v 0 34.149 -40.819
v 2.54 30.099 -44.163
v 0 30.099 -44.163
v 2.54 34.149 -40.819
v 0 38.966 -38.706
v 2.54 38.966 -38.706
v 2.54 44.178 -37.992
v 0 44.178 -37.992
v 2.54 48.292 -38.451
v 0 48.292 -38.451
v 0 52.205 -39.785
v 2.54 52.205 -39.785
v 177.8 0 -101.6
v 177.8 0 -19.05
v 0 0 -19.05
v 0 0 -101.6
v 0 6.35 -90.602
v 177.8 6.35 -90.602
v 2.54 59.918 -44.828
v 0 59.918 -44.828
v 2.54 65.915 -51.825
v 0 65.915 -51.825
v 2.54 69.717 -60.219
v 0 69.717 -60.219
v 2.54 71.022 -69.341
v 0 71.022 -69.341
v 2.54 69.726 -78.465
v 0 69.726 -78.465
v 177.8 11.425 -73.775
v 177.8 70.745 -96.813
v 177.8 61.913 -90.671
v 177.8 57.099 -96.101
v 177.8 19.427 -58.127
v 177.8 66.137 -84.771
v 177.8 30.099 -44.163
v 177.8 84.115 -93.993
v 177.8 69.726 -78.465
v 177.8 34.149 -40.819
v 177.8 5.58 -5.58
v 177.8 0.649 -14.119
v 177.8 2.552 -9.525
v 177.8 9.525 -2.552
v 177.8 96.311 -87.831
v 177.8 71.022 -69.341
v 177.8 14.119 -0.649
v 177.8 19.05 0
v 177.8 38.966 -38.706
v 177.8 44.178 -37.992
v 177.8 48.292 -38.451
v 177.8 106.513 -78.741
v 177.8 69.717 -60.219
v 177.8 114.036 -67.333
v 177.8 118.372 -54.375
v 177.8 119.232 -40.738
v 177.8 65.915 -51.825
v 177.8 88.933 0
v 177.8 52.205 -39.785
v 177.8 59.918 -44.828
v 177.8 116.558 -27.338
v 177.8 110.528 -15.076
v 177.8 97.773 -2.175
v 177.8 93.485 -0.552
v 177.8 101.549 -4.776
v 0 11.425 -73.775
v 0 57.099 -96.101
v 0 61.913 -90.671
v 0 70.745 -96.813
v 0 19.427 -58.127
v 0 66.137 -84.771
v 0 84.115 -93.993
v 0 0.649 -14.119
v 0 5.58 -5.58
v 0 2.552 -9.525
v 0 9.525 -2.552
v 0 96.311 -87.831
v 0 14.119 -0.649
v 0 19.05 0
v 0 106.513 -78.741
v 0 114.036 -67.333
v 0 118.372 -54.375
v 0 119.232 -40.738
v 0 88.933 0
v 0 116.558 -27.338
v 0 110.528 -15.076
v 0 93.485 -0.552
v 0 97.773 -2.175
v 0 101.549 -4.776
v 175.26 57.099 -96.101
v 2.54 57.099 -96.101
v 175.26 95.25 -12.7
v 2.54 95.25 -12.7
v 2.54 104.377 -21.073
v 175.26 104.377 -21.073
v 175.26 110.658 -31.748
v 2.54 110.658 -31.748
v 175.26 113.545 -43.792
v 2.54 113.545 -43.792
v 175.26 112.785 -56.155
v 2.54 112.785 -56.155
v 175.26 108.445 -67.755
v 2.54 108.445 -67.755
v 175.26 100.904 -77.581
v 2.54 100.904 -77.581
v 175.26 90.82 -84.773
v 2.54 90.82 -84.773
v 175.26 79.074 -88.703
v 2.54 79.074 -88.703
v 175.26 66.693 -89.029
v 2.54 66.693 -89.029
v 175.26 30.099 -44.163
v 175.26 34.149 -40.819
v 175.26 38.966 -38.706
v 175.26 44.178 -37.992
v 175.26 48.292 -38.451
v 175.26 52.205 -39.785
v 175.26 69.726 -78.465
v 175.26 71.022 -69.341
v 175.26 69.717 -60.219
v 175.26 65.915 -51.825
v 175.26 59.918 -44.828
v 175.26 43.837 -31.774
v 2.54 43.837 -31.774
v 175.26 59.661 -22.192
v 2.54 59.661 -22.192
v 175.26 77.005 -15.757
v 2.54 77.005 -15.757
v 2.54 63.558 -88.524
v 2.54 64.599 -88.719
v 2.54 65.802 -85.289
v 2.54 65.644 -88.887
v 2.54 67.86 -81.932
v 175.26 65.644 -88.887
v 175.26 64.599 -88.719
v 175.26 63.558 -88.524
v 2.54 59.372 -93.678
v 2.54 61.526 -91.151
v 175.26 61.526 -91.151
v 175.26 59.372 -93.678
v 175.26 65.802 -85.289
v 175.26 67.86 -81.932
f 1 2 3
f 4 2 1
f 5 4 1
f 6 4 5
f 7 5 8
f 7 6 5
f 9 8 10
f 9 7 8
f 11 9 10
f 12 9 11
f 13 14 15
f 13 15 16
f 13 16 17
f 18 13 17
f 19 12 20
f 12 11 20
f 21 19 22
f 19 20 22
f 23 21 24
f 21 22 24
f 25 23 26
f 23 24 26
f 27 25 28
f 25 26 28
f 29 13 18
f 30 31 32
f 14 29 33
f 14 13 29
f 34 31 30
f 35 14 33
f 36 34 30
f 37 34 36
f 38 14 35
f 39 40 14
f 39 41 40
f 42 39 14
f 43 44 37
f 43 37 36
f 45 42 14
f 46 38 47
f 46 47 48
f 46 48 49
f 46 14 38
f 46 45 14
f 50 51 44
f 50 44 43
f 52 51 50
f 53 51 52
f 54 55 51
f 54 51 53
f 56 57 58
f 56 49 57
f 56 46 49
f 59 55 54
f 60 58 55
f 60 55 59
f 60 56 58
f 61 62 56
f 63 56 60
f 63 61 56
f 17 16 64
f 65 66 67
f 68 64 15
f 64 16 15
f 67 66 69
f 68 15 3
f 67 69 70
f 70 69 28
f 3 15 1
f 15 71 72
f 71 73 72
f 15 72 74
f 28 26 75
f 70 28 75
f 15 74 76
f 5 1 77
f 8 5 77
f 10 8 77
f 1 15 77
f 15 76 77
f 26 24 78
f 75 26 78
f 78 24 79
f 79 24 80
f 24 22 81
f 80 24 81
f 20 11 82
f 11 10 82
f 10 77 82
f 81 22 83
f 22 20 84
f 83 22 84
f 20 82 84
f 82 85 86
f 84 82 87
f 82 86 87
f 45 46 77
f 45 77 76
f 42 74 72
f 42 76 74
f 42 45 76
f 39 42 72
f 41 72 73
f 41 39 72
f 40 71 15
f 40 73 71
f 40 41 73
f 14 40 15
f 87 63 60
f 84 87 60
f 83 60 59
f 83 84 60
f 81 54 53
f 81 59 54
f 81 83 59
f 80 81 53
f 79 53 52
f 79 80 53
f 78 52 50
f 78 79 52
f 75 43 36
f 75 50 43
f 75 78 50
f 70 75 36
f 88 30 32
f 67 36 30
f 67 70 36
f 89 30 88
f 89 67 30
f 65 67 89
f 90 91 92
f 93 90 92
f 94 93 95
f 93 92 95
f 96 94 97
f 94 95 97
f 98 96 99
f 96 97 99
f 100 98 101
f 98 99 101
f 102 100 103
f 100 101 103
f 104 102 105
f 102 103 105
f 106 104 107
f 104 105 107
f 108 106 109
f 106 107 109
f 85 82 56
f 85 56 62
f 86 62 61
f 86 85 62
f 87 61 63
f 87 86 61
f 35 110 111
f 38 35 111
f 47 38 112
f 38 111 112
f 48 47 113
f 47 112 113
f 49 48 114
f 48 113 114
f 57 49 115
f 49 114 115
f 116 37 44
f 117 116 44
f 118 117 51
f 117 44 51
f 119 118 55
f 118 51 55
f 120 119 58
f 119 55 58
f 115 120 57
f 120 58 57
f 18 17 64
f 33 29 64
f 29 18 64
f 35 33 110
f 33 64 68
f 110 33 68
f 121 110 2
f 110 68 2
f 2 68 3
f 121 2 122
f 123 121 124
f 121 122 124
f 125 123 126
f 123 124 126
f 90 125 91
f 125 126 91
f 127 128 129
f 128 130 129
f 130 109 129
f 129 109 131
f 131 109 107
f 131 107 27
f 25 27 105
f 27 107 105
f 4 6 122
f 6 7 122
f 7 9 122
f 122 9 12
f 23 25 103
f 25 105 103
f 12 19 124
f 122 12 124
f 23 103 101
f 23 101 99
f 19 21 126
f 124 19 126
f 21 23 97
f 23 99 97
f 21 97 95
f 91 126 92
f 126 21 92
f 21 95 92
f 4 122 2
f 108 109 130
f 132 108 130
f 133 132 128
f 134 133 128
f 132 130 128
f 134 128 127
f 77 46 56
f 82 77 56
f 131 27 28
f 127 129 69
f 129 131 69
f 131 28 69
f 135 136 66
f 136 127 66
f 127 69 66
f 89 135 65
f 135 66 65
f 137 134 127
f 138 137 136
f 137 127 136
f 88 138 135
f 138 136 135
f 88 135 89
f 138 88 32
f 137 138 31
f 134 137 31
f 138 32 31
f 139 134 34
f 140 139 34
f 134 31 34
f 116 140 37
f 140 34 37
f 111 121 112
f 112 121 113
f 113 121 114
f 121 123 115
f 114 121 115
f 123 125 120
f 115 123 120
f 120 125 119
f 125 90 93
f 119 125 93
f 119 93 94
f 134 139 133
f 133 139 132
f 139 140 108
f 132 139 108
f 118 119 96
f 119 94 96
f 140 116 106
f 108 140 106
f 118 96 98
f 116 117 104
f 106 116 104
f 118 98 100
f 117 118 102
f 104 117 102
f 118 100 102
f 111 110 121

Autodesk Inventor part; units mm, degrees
ref_plane "YZ Plane" through (0, 0, 0) normal (1, 0, 0) x (0, 1, 0)
ref_plane "XZ Plane" through (0, 0, 0) normal (0, 1, 0) x (-1, 0, 0)
sketch "Sketch1" plane through (0, 0, 0) normal (1, 0, 0) x (0, 1, 0)
  line L0 (0, 0) -> (95.25, 0)
  line L1 (0, 0) -> (0, -101.6)
  line L2 (0, -101.6) -> (6.35, -90.6015)
  line L3 (0, -101.6) -> (12.7, -101.6) construction
  arc A0 (66.6929, -89.0292) -> (95.25, -12.7) centre (71.7931, -47.4307) ccw
  arc A1 (57.0991, -96.1007) -> (95.25, 0) centre (66.6458, -44.2676) ccw
  arc A2 (57.0991, -96.1007) -> (66.6929, -89.0292) centre (51.9568, -79.0806) ccw
  arc A3 (95.25, -12.7) -> (6.35, -90.6015) centre (102.2308, -110.3428) ccw
  dimension "d18" = 101.6
  dimension "d20" = 12.7
  dimension "d21" = 60
  dimension "d27" = 41.91
  dimension "d28" = 52.705
  dimension "d29" = 17.78
  dimension "d30" = 57.099
  dimension "d31" = 66.6458
  dimension "d32" = 71.7931
  dimension "d33" = 95.25
  dimension "d34" = 66.6929
  dimension "d35" = 12.7
  dimension "d36" = 96.1007
  dimension "d38" = 74.276
extrude "Extrusion1" add sketch "Sketch1" along normal blind 177.8
sketch "Sketch2" plane through (177.8, 0, 0) normal (1, 0, 0) x (0, 0, -1)
  arc A0 (89.0292, 66.6929) -> (12.7, 95.25) centre (47.4307, 71.7931) ccw projected
  arc A1 (12.7, 95.25) -> (90.6015, 6.35) centre (110.3428, 102.2308) ccw projected
  line L0 (0, 95.25) -> (0, 0) projected
  arc A2 (96.1007, 57.0991) -> (89.0292, 66.6929) centre (79.0806, 51.9568) ccw projected
  line L1 (0, 58.8778) -> (0, 95.25)
  line L2 (0, 0) -> (101.6, 0) projected
  arc A3 (78.465, 69.7261) -> (36.7184, 37.715) centre (69.3573, 38.3767) ccw
  arc A4 (96.1007, 57.0991) -> (78.465, 69.7261) centre (47.1123, 7.3079) ccw
  line L3 (0, 58.8778) -> (36.7184, 37.715)
  arc A5 (96.1007, 57.0991) -> (0, 95.25) centre (44.2676, 66.6458) ccw
  arc A6 (96.1007, 57.0991) -> (0, 95.25) centre (44.2676, 66.6458) ccw projected
  arc A7 (12.7, 95.25) -> (36.7184, 37.715) centre (110.3428, 102.2308) ccw
  arc A8 (89.0292, 66.6929) -> (12.7, 95.25) centre (47.4307, 71.7931) ccw
  arc A9 (96.1007, 57.0991) -> (89.0292, 66.6929) centre (79.0806, 51.9568) ccw
  dimension "d49" = 21.1628
  dimension "d50" = 32.6457
  dimension "d51" = 69.85
  dimension "d52" = 16.8716
  dimension "d53" = 59.3379
ref_plane "Work Plane1" through (88.9, 0, 0) normal (1, 0, 0) x (0, 0, -1)
extrude "Extrusion2" add sketch "Sketch2" against normal blind 2.54
fillet "Fillet3" radius 19.05 1 edges at (176.53, 37.715, -36.7184)
mirror "Mirror1" about plane through (88.9, 0, 0) normal (1, 0, 0) of "Extrusion2", "Fillet3"
fillet "Fillet2" radius 19.05 2 edges at (88.9, 0, 0) (88.9, 95.25, 0)
sketch "Sketch3" plane through (2.54, 71.7931, -47.4307) normal (1, 0, 0) x (0, -0.3504094, -0.9365966)
  arc A0 (50.7331, 3.2921) -> (40.7482, 9.7997) centre (36.594, -7.4882) ccw projected
  arc A1 (40.7482, 9.7997) -> (-40.7482, 9.7997) centre (0, 0) ccw projected
  arc A2 (50.7331, 3.2921) -> (29.7909, 8.9388) centre (22.298, -60.5081) ccw projected
  arc A3 (50.7331, 3.2921) -> (-50.3771, 12.9226) centre (-1.1589, -5.9293) ccw projected
  arc A4 (50.7331, 3.2921) -> (40.7482, 9.7997) centre (36.594, -7.4882) ccw
  arc A5 (41.3731, 6.6868) -> (40.7482, 9.7997) centre (0, 0) ccw
  arc A6 (50.7331, 3.2921) -> (29.7909, 8.9388) centre (22.298, -60.5081) ccw projected
  arc A7 (-35.8187, -21.7593) -> (-43.5602, -37.2333) centre (22.298, -60.5081) ccw
  arc A8 (50.7331, 3.2921) -> (41.3731, 6.6868) centre (22.298, -60.5081) ccw
  point P0 (-19.2665, -83.8613)
extrude "Extrusion3" add sketch "Sketch3" along normal up to next
sketch "Sketch4" plane through (177.8, 0, 0) normal (1, 0, 0) x (0, 0, -1)
  arc A0 (96.1007, 57.0991) -> (4.7759, 101.5489) centre (44.2676, 66.6458) ccw projected
  line L0 (19.05, 0) -> (101.6, 0) projected
  arc A1 (96.1007, 57.0991) -> (4.7759, 101.5489) centre (44.2676, 66.6458) ccw projected
  point P0 (0, 0)
  point P1 (44.2676, 119.3508)
  dimension "d57" = 119.3508
properties part number "plowV2"
